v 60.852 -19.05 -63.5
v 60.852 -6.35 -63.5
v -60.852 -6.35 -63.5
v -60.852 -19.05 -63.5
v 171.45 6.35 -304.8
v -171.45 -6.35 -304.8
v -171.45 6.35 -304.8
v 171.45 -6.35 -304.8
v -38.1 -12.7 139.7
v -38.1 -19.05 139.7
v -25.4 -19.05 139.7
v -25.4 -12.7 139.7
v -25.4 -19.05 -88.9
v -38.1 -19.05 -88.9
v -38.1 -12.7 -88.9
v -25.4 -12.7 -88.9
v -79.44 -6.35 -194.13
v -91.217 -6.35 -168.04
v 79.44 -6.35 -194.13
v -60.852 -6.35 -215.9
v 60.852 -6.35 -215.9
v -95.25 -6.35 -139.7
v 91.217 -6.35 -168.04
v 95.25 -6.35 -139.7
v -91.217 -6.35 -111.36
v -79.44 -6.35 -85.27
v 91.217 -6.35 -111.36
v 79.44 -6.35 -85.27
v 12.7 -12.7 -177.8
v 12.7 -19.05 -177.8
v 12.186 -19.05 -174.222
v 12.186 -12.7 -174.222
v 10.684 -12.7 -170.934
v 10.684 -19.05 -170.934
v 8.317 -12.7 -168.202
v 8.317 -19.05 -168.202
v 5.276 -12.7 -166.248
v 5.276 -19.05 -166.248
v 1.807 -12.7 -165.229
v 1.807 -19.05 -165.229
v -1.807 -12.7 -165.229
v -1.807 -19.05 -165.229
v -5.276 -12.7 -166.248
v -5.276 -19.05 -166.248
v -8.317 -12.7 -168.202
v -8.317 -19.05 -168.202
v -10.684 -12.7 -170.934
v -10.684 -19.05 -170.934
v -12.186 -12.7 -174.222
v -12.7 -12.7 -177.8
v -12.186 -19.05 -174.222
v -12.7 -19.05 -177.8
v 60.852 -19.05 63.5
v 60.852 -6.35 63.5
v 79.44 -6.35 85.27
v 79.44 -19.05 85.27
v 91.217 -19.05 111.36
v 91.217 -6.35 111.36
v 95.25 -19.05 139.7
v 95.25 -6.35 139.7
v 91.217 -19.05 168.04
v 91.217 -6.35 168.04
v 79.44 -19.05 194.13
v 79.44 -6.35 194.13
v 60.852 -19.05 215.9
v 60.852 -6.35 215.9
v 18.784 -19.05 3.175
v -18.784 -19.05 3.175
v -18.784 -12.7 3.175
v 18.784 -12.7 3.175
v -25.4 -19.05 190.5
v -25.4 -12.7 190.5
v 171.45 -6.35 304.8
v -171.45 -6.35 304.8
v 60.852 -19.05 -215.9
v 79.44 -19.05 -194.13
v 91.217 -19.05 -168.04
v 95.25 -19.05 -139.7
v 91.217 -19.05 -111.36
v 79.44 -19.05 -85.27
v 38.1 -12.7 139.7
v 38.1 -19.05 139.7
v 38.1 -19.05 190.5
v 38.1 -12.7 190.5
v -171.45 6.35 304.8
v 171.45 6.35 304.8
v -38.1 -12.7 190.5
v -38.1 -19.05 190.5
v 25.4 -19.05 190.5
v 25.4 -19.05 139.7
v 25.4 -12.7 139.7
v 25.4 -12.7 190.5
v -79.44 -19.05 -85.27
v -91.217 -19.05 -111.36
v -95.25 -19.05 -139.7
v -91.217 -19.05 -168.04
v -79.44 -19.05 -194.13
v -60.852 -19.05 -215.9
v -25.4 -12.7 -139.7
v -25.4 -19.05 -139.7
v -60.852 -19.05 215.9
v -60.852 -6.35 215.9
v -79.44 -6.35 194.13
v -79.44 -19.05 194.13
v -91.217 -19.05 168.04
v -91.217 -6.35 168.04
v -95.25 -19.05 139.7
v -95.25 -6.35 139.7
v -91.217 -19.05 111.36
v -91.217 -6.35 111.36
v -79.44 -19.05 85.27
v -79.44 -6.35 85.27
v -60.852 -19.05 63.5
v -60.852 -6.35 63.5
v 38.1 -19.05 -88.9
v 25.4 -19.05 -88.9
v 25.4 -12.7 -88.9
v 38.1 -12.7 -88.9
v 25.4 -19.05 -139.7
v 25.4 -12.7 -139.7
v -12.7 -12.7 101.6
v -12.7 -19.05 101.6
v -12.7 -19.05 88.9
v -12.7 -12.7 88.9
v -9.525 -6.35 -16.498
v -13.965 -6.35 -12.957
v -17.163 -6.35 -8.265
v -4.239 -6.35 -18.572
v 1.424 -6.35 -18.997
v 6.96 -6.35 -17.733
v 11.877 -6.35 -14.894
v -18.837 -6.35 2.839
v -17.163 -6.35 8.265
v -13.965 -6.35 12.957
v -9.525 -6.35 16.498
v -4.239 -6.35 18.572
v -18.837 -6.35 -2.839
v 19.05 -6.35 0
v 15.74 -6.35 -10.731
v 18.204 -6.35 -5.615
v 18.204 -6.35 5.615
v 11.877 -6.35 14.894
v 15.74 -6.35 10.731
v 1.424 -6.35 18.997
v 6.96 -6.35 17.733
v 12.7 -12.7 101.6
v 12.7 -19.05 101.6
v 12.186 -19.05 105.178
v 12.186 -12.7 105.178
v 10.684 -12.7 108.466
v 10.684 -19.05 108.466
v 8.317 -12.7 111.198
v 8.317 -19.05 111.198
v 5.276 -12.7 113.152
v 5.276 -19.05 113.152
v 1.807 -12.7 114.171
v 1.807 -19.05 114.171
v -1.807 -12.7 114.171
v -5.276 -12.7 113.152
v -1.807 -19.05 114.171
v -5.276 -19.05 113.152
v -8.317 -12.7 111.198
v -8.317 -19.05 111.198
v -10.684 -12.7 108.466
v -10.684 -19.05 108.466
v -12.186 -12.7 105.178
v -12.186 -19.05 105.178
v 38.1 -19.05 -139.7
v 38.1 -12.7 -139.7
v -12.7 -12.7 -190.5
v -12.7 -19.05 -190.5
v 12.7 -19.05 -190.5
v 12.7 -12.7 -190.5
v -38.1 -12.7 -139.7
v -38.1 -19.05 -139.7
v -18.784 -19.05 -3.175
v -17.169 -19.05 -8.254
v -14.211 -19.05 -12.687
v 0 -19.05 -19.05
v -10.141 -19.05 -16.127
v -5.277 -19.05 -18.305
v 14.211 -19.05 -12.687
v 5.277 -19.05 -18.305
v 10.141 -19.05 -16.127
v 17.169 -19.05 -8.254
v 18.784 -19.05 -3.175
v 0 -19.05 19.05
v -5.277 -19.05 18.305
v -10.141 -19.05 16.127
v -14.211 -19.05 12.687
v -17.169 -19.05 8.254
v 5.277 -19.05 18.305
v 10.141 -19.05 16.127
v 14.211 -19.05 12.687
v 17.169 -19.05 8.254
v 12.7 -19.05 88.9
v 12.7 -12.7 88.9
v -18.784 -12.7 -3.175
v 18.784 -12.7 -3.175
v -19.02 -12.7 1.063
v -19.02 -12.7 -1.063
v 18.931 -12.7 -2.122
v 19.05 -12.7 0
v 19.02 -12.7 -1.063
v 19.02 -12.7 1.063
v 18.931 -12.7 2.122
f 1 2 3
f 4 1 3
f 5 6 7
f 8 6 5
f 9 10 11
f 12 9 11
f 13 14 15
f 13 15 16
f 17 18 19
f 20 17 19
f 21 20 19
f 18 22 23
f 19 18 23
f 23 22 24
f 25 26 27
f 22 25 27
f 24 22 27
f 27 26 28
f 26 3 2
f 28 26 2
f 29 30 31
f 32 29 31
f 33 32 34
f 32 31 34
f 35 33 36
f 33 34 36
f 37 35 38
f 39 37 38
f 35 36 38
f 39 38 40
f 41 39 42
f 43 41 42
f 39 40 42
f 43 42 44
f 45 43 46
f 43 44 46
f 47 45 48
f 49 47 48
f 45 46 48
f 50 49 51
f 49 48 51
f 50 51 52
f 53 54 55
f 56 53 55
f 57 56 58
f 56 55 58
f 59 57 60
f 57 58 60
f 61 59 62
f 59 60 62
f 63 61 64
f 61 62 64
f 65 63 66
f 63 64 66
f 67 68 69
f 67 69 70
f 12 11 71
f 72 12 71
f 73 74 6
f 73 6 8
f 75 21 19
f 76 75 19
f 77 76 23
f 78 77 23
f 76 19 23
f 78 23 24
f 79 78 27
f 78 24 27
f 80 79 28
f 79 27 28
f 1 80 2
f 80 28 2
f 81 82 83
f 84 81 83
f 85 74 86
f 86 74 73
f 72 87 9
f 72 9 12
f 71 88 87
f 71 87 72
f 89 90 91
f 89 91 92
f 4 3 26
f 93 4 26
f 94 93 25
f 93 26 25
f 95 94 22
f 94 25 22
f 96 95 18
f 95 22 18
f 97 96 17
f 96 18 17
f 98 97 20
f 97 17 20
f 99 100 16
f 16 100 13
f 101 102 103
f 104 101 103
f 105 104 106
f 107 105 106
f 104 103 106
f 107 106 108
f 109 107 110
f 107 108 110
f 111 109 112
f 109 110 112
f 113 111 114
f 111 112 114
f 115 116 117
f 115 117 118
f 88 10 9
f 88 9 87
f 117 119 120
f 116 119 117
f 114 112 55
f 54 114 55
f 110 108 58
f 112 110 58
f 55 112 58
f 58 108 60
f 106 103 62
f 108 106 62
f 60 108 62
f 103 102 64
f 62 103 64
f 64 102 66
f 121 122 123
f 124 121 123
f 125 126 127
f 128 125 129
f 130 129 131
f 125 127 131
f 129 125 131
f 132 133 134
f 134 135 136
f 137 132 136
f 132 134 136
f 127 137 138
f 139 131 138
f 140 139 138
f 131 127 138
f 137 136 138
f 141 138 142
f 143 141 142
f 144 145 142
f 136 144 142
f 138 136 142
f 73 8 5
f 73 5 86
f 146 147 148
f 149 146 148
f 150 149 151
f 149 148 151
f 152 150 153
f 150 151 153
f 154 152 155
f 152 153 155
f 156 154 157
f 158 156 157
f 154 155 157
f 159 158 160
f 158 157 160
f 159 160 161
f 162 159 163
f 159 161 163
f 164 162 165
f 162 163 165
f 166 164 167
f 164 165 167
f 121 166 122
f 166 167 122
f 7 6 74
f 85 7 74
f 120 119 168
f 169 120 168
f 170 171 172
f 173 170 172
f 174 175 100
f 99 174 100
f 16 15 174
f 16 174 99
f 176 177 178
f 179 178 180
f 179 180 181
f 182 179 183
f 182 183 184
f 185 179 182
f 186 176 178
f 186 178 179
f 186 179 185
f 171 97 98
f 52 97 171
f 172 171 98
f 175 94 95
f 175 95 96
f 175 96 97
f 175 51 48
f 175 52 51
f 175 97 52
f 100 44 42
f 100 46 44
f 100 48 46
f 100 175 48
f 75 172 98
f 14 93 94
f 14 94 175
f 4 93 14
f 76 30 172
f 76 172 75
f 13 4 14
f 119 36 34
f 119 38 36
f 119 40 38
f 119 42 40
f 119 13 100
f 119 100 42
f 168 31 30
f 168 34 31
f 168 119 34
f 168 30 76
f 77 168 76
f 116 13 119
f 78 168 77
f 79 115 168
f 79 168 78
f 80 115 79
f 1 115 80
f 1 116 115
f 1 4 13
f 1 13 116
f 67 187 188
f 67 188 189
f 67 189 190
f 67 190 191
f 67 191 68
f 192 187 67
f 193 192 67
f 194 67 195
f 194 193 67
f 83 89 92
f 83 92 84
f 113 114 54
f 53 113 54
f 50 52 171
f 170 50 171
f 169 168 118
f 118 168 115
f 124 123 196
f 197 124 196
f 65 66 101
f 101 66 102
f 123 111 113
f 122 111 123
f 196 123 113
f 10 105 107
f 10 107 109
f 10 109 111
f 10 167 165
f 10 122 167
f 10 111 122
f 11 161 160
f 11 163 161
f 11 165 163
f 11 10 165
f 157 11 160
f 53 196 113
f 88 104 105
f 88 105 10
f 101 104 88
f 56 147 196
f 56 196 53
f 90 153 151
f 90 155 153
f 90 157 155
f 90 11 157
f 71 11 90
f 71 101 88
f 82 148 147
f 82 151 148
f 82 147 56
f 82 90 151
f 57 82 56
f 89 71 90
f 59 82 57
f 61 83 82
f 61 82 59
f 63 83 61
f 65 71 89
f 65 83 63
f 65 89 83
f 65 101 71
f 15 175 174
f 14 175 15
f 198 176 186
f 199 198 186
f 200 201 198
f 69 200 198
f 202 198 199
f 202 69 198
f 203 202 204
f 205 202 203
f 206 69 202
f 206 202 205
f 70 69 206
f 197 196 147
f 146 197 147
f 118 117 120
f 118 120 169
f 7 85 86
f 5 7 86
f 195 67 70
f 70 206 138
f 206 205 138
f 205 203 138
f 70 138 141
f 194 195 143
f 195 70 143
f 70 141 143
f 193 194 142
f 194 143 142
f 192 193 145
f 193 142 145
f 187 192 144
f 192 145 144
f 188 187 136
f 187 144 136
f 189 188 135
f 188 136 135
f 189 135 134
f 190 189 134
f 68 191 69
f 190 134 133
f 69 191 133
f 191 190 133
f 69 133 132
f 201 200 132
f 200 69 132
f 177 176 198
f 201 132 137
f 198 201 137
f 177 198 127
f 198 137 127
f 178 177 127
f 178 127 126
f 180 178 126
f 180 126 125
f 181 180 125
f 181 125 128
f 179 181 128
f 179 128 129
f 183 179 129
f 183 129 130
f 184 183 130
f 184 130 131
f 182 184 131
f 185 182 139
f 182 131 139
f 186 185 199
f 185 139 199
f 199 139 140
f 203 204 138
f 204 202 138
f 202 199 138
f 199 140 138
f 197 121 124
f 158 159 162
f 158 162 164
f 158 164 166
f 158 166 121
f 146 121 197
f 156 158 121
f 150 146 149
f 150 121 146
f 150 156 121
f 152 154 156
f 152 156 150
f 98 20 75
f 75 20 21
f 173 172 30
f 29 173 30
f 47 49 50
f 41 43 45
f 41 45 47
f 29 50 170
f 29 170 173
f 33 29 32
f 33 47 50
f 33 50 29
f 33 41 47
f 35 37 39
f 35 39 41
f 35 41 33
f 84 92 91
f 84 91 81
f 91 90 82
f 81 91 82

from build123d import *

# Parameters (mm, degrees)
F0_W     = 342.9
F0_H     = 609.6
F1_DEPTH = 6.35
F3_DEPTH = 12.7
F2_R     = 19.05
F4_W     = 12.7
F4_H     = 50.8
F4_W_2   = 110.2786660194
F4_H_2   = 6.35
F5_DEPTH = 6.35


with BuildPart() as f1:
    # F0 (on Front) → F1 (new body, symmetric)
    with BuildSketch(Plane.XZ):
        Rectangle(F0_W, F0_H)
    extrude(amount=F1_DEPTH, both=True)


with BuildPart() as f3:
    # F2 (on face) → F3 (new body)
    with BuildSketch(Plane.XZ.offset(6.35)):
        with BuildLine():
            Line((60.852083301, 215.9), (-60.852083301, 215.9))
            ThreePointArc((-60.852083301, 215.9), (-95.25, 139.7), (-60.852083301, 63.5))
            Line((-60.852083301, 63.5), (60.852083301, 63.5))
            ThreePointArc((60.852083301, 63.5), (95.25, 139.7), (60.852083301, 215.9))
        make_face()
    extrude(amount=F3_DEPTH)


with BuildPart() as f3b:
    # F2 (on face) → F3, piece 2 (new body)
    with BuildSketch(Plane.XZ.offset(6.35)):
        with BuildLine():
            Line((60.852083301, -63.5), (-60.852083301, -63.5))
            ThreePointArc((-60.852083301, -63.5), (-95.25, -139.7), (-60.852083301, -215.9))
            Line((-60.852083301, -215.9), (60.852083301, -215.9))
            ThreePointArc((60.852083301, -215.9), (95.25, -139.7), (60.852083301, -63.5))
        make_face()
    extrude(amount=F3_DEPTH)


with BuildPart() as f3c:
    # F2 (on face) → F3, piece 3 (new body)
    with BuildSketch(Plane.XZ.offset(6.35)):
        Circle(F2_R)
    extrude(amount=F3_DEPTH)


with BuildPart() as f5_tool:
    # F4 (on face) → F5 (new body)
    with BuildSketch(Plane.XZ.offset(19.05)):
        with Locations((-31.75, 165.1)):
            Rectangle(F4_W, F4_H)
        with Locations((31.75, 165.1)):
            Rectangle(F4_W, F4_H)
        with Locations((-31.75, -114.3)):
            Rectangle(F4_W, F4_H)
        with Locations((31.75, -114.3)):
            Rectangle(F4_W, F4_H)
        Rectangle(F4_W_2, F4_H_2)
        with BuildLine():
            Line((-12.7, 101.6), (-12.7, 88.9))
            Line((-12.7, 88.9), (12.7, 88.9))
            Line((12.7, 88.9), (12.7, 101.6))
            ThreePointArc((12.7, 101.6), (0, 114.3), (-12.7, 101.6))
        make_face()
        with BuildLine():
            Line((-12.7, -177.8), (-12.7, -190.5))
            Line((-12.7, -190.5), (12.7, -190.5))
            Line((12.7, -190.5), (12.7, -177.8))
            ThreePointArc((12.7, -177.8), (0, -165.1), (-12.7, -177.8))
        make_face()
    extrude(amount=-F5_DEPTH)


with BuildPart() as f3_1:
    add(f3.part)

    # F5: cut by f5_tool
    add(f5_tool.part, mode=Mode.SUBTRACT)


with BuildPart() as f3b_1:
    add(f3b.part)

    # F5: cut by f5_tool
    add(f5_tool.part, mode=Mode.SUBTRACT)


with BuildPart() as f3c_1:
    add(f3c.part)

    # F5: cut by f5_tool
    add(f5_tool.part, mode=Mode.SUBTRACT)


with BuildPart() as f3_2:
    # F6: moved
    add(f3_1.part)


with BuildPart() as f3b_2:
    # F6: moved
    add(f3b_1.part)


with BuildPart() as f1_1:
    # F6: moved
    add(f1.part)


with BuildPart() as f3c_2:
    # F6: moved
    add(f3c_1.part)


solid = Compound([f3_2.part, f3b_2.part, f1_1.part, f3c_2.part])
